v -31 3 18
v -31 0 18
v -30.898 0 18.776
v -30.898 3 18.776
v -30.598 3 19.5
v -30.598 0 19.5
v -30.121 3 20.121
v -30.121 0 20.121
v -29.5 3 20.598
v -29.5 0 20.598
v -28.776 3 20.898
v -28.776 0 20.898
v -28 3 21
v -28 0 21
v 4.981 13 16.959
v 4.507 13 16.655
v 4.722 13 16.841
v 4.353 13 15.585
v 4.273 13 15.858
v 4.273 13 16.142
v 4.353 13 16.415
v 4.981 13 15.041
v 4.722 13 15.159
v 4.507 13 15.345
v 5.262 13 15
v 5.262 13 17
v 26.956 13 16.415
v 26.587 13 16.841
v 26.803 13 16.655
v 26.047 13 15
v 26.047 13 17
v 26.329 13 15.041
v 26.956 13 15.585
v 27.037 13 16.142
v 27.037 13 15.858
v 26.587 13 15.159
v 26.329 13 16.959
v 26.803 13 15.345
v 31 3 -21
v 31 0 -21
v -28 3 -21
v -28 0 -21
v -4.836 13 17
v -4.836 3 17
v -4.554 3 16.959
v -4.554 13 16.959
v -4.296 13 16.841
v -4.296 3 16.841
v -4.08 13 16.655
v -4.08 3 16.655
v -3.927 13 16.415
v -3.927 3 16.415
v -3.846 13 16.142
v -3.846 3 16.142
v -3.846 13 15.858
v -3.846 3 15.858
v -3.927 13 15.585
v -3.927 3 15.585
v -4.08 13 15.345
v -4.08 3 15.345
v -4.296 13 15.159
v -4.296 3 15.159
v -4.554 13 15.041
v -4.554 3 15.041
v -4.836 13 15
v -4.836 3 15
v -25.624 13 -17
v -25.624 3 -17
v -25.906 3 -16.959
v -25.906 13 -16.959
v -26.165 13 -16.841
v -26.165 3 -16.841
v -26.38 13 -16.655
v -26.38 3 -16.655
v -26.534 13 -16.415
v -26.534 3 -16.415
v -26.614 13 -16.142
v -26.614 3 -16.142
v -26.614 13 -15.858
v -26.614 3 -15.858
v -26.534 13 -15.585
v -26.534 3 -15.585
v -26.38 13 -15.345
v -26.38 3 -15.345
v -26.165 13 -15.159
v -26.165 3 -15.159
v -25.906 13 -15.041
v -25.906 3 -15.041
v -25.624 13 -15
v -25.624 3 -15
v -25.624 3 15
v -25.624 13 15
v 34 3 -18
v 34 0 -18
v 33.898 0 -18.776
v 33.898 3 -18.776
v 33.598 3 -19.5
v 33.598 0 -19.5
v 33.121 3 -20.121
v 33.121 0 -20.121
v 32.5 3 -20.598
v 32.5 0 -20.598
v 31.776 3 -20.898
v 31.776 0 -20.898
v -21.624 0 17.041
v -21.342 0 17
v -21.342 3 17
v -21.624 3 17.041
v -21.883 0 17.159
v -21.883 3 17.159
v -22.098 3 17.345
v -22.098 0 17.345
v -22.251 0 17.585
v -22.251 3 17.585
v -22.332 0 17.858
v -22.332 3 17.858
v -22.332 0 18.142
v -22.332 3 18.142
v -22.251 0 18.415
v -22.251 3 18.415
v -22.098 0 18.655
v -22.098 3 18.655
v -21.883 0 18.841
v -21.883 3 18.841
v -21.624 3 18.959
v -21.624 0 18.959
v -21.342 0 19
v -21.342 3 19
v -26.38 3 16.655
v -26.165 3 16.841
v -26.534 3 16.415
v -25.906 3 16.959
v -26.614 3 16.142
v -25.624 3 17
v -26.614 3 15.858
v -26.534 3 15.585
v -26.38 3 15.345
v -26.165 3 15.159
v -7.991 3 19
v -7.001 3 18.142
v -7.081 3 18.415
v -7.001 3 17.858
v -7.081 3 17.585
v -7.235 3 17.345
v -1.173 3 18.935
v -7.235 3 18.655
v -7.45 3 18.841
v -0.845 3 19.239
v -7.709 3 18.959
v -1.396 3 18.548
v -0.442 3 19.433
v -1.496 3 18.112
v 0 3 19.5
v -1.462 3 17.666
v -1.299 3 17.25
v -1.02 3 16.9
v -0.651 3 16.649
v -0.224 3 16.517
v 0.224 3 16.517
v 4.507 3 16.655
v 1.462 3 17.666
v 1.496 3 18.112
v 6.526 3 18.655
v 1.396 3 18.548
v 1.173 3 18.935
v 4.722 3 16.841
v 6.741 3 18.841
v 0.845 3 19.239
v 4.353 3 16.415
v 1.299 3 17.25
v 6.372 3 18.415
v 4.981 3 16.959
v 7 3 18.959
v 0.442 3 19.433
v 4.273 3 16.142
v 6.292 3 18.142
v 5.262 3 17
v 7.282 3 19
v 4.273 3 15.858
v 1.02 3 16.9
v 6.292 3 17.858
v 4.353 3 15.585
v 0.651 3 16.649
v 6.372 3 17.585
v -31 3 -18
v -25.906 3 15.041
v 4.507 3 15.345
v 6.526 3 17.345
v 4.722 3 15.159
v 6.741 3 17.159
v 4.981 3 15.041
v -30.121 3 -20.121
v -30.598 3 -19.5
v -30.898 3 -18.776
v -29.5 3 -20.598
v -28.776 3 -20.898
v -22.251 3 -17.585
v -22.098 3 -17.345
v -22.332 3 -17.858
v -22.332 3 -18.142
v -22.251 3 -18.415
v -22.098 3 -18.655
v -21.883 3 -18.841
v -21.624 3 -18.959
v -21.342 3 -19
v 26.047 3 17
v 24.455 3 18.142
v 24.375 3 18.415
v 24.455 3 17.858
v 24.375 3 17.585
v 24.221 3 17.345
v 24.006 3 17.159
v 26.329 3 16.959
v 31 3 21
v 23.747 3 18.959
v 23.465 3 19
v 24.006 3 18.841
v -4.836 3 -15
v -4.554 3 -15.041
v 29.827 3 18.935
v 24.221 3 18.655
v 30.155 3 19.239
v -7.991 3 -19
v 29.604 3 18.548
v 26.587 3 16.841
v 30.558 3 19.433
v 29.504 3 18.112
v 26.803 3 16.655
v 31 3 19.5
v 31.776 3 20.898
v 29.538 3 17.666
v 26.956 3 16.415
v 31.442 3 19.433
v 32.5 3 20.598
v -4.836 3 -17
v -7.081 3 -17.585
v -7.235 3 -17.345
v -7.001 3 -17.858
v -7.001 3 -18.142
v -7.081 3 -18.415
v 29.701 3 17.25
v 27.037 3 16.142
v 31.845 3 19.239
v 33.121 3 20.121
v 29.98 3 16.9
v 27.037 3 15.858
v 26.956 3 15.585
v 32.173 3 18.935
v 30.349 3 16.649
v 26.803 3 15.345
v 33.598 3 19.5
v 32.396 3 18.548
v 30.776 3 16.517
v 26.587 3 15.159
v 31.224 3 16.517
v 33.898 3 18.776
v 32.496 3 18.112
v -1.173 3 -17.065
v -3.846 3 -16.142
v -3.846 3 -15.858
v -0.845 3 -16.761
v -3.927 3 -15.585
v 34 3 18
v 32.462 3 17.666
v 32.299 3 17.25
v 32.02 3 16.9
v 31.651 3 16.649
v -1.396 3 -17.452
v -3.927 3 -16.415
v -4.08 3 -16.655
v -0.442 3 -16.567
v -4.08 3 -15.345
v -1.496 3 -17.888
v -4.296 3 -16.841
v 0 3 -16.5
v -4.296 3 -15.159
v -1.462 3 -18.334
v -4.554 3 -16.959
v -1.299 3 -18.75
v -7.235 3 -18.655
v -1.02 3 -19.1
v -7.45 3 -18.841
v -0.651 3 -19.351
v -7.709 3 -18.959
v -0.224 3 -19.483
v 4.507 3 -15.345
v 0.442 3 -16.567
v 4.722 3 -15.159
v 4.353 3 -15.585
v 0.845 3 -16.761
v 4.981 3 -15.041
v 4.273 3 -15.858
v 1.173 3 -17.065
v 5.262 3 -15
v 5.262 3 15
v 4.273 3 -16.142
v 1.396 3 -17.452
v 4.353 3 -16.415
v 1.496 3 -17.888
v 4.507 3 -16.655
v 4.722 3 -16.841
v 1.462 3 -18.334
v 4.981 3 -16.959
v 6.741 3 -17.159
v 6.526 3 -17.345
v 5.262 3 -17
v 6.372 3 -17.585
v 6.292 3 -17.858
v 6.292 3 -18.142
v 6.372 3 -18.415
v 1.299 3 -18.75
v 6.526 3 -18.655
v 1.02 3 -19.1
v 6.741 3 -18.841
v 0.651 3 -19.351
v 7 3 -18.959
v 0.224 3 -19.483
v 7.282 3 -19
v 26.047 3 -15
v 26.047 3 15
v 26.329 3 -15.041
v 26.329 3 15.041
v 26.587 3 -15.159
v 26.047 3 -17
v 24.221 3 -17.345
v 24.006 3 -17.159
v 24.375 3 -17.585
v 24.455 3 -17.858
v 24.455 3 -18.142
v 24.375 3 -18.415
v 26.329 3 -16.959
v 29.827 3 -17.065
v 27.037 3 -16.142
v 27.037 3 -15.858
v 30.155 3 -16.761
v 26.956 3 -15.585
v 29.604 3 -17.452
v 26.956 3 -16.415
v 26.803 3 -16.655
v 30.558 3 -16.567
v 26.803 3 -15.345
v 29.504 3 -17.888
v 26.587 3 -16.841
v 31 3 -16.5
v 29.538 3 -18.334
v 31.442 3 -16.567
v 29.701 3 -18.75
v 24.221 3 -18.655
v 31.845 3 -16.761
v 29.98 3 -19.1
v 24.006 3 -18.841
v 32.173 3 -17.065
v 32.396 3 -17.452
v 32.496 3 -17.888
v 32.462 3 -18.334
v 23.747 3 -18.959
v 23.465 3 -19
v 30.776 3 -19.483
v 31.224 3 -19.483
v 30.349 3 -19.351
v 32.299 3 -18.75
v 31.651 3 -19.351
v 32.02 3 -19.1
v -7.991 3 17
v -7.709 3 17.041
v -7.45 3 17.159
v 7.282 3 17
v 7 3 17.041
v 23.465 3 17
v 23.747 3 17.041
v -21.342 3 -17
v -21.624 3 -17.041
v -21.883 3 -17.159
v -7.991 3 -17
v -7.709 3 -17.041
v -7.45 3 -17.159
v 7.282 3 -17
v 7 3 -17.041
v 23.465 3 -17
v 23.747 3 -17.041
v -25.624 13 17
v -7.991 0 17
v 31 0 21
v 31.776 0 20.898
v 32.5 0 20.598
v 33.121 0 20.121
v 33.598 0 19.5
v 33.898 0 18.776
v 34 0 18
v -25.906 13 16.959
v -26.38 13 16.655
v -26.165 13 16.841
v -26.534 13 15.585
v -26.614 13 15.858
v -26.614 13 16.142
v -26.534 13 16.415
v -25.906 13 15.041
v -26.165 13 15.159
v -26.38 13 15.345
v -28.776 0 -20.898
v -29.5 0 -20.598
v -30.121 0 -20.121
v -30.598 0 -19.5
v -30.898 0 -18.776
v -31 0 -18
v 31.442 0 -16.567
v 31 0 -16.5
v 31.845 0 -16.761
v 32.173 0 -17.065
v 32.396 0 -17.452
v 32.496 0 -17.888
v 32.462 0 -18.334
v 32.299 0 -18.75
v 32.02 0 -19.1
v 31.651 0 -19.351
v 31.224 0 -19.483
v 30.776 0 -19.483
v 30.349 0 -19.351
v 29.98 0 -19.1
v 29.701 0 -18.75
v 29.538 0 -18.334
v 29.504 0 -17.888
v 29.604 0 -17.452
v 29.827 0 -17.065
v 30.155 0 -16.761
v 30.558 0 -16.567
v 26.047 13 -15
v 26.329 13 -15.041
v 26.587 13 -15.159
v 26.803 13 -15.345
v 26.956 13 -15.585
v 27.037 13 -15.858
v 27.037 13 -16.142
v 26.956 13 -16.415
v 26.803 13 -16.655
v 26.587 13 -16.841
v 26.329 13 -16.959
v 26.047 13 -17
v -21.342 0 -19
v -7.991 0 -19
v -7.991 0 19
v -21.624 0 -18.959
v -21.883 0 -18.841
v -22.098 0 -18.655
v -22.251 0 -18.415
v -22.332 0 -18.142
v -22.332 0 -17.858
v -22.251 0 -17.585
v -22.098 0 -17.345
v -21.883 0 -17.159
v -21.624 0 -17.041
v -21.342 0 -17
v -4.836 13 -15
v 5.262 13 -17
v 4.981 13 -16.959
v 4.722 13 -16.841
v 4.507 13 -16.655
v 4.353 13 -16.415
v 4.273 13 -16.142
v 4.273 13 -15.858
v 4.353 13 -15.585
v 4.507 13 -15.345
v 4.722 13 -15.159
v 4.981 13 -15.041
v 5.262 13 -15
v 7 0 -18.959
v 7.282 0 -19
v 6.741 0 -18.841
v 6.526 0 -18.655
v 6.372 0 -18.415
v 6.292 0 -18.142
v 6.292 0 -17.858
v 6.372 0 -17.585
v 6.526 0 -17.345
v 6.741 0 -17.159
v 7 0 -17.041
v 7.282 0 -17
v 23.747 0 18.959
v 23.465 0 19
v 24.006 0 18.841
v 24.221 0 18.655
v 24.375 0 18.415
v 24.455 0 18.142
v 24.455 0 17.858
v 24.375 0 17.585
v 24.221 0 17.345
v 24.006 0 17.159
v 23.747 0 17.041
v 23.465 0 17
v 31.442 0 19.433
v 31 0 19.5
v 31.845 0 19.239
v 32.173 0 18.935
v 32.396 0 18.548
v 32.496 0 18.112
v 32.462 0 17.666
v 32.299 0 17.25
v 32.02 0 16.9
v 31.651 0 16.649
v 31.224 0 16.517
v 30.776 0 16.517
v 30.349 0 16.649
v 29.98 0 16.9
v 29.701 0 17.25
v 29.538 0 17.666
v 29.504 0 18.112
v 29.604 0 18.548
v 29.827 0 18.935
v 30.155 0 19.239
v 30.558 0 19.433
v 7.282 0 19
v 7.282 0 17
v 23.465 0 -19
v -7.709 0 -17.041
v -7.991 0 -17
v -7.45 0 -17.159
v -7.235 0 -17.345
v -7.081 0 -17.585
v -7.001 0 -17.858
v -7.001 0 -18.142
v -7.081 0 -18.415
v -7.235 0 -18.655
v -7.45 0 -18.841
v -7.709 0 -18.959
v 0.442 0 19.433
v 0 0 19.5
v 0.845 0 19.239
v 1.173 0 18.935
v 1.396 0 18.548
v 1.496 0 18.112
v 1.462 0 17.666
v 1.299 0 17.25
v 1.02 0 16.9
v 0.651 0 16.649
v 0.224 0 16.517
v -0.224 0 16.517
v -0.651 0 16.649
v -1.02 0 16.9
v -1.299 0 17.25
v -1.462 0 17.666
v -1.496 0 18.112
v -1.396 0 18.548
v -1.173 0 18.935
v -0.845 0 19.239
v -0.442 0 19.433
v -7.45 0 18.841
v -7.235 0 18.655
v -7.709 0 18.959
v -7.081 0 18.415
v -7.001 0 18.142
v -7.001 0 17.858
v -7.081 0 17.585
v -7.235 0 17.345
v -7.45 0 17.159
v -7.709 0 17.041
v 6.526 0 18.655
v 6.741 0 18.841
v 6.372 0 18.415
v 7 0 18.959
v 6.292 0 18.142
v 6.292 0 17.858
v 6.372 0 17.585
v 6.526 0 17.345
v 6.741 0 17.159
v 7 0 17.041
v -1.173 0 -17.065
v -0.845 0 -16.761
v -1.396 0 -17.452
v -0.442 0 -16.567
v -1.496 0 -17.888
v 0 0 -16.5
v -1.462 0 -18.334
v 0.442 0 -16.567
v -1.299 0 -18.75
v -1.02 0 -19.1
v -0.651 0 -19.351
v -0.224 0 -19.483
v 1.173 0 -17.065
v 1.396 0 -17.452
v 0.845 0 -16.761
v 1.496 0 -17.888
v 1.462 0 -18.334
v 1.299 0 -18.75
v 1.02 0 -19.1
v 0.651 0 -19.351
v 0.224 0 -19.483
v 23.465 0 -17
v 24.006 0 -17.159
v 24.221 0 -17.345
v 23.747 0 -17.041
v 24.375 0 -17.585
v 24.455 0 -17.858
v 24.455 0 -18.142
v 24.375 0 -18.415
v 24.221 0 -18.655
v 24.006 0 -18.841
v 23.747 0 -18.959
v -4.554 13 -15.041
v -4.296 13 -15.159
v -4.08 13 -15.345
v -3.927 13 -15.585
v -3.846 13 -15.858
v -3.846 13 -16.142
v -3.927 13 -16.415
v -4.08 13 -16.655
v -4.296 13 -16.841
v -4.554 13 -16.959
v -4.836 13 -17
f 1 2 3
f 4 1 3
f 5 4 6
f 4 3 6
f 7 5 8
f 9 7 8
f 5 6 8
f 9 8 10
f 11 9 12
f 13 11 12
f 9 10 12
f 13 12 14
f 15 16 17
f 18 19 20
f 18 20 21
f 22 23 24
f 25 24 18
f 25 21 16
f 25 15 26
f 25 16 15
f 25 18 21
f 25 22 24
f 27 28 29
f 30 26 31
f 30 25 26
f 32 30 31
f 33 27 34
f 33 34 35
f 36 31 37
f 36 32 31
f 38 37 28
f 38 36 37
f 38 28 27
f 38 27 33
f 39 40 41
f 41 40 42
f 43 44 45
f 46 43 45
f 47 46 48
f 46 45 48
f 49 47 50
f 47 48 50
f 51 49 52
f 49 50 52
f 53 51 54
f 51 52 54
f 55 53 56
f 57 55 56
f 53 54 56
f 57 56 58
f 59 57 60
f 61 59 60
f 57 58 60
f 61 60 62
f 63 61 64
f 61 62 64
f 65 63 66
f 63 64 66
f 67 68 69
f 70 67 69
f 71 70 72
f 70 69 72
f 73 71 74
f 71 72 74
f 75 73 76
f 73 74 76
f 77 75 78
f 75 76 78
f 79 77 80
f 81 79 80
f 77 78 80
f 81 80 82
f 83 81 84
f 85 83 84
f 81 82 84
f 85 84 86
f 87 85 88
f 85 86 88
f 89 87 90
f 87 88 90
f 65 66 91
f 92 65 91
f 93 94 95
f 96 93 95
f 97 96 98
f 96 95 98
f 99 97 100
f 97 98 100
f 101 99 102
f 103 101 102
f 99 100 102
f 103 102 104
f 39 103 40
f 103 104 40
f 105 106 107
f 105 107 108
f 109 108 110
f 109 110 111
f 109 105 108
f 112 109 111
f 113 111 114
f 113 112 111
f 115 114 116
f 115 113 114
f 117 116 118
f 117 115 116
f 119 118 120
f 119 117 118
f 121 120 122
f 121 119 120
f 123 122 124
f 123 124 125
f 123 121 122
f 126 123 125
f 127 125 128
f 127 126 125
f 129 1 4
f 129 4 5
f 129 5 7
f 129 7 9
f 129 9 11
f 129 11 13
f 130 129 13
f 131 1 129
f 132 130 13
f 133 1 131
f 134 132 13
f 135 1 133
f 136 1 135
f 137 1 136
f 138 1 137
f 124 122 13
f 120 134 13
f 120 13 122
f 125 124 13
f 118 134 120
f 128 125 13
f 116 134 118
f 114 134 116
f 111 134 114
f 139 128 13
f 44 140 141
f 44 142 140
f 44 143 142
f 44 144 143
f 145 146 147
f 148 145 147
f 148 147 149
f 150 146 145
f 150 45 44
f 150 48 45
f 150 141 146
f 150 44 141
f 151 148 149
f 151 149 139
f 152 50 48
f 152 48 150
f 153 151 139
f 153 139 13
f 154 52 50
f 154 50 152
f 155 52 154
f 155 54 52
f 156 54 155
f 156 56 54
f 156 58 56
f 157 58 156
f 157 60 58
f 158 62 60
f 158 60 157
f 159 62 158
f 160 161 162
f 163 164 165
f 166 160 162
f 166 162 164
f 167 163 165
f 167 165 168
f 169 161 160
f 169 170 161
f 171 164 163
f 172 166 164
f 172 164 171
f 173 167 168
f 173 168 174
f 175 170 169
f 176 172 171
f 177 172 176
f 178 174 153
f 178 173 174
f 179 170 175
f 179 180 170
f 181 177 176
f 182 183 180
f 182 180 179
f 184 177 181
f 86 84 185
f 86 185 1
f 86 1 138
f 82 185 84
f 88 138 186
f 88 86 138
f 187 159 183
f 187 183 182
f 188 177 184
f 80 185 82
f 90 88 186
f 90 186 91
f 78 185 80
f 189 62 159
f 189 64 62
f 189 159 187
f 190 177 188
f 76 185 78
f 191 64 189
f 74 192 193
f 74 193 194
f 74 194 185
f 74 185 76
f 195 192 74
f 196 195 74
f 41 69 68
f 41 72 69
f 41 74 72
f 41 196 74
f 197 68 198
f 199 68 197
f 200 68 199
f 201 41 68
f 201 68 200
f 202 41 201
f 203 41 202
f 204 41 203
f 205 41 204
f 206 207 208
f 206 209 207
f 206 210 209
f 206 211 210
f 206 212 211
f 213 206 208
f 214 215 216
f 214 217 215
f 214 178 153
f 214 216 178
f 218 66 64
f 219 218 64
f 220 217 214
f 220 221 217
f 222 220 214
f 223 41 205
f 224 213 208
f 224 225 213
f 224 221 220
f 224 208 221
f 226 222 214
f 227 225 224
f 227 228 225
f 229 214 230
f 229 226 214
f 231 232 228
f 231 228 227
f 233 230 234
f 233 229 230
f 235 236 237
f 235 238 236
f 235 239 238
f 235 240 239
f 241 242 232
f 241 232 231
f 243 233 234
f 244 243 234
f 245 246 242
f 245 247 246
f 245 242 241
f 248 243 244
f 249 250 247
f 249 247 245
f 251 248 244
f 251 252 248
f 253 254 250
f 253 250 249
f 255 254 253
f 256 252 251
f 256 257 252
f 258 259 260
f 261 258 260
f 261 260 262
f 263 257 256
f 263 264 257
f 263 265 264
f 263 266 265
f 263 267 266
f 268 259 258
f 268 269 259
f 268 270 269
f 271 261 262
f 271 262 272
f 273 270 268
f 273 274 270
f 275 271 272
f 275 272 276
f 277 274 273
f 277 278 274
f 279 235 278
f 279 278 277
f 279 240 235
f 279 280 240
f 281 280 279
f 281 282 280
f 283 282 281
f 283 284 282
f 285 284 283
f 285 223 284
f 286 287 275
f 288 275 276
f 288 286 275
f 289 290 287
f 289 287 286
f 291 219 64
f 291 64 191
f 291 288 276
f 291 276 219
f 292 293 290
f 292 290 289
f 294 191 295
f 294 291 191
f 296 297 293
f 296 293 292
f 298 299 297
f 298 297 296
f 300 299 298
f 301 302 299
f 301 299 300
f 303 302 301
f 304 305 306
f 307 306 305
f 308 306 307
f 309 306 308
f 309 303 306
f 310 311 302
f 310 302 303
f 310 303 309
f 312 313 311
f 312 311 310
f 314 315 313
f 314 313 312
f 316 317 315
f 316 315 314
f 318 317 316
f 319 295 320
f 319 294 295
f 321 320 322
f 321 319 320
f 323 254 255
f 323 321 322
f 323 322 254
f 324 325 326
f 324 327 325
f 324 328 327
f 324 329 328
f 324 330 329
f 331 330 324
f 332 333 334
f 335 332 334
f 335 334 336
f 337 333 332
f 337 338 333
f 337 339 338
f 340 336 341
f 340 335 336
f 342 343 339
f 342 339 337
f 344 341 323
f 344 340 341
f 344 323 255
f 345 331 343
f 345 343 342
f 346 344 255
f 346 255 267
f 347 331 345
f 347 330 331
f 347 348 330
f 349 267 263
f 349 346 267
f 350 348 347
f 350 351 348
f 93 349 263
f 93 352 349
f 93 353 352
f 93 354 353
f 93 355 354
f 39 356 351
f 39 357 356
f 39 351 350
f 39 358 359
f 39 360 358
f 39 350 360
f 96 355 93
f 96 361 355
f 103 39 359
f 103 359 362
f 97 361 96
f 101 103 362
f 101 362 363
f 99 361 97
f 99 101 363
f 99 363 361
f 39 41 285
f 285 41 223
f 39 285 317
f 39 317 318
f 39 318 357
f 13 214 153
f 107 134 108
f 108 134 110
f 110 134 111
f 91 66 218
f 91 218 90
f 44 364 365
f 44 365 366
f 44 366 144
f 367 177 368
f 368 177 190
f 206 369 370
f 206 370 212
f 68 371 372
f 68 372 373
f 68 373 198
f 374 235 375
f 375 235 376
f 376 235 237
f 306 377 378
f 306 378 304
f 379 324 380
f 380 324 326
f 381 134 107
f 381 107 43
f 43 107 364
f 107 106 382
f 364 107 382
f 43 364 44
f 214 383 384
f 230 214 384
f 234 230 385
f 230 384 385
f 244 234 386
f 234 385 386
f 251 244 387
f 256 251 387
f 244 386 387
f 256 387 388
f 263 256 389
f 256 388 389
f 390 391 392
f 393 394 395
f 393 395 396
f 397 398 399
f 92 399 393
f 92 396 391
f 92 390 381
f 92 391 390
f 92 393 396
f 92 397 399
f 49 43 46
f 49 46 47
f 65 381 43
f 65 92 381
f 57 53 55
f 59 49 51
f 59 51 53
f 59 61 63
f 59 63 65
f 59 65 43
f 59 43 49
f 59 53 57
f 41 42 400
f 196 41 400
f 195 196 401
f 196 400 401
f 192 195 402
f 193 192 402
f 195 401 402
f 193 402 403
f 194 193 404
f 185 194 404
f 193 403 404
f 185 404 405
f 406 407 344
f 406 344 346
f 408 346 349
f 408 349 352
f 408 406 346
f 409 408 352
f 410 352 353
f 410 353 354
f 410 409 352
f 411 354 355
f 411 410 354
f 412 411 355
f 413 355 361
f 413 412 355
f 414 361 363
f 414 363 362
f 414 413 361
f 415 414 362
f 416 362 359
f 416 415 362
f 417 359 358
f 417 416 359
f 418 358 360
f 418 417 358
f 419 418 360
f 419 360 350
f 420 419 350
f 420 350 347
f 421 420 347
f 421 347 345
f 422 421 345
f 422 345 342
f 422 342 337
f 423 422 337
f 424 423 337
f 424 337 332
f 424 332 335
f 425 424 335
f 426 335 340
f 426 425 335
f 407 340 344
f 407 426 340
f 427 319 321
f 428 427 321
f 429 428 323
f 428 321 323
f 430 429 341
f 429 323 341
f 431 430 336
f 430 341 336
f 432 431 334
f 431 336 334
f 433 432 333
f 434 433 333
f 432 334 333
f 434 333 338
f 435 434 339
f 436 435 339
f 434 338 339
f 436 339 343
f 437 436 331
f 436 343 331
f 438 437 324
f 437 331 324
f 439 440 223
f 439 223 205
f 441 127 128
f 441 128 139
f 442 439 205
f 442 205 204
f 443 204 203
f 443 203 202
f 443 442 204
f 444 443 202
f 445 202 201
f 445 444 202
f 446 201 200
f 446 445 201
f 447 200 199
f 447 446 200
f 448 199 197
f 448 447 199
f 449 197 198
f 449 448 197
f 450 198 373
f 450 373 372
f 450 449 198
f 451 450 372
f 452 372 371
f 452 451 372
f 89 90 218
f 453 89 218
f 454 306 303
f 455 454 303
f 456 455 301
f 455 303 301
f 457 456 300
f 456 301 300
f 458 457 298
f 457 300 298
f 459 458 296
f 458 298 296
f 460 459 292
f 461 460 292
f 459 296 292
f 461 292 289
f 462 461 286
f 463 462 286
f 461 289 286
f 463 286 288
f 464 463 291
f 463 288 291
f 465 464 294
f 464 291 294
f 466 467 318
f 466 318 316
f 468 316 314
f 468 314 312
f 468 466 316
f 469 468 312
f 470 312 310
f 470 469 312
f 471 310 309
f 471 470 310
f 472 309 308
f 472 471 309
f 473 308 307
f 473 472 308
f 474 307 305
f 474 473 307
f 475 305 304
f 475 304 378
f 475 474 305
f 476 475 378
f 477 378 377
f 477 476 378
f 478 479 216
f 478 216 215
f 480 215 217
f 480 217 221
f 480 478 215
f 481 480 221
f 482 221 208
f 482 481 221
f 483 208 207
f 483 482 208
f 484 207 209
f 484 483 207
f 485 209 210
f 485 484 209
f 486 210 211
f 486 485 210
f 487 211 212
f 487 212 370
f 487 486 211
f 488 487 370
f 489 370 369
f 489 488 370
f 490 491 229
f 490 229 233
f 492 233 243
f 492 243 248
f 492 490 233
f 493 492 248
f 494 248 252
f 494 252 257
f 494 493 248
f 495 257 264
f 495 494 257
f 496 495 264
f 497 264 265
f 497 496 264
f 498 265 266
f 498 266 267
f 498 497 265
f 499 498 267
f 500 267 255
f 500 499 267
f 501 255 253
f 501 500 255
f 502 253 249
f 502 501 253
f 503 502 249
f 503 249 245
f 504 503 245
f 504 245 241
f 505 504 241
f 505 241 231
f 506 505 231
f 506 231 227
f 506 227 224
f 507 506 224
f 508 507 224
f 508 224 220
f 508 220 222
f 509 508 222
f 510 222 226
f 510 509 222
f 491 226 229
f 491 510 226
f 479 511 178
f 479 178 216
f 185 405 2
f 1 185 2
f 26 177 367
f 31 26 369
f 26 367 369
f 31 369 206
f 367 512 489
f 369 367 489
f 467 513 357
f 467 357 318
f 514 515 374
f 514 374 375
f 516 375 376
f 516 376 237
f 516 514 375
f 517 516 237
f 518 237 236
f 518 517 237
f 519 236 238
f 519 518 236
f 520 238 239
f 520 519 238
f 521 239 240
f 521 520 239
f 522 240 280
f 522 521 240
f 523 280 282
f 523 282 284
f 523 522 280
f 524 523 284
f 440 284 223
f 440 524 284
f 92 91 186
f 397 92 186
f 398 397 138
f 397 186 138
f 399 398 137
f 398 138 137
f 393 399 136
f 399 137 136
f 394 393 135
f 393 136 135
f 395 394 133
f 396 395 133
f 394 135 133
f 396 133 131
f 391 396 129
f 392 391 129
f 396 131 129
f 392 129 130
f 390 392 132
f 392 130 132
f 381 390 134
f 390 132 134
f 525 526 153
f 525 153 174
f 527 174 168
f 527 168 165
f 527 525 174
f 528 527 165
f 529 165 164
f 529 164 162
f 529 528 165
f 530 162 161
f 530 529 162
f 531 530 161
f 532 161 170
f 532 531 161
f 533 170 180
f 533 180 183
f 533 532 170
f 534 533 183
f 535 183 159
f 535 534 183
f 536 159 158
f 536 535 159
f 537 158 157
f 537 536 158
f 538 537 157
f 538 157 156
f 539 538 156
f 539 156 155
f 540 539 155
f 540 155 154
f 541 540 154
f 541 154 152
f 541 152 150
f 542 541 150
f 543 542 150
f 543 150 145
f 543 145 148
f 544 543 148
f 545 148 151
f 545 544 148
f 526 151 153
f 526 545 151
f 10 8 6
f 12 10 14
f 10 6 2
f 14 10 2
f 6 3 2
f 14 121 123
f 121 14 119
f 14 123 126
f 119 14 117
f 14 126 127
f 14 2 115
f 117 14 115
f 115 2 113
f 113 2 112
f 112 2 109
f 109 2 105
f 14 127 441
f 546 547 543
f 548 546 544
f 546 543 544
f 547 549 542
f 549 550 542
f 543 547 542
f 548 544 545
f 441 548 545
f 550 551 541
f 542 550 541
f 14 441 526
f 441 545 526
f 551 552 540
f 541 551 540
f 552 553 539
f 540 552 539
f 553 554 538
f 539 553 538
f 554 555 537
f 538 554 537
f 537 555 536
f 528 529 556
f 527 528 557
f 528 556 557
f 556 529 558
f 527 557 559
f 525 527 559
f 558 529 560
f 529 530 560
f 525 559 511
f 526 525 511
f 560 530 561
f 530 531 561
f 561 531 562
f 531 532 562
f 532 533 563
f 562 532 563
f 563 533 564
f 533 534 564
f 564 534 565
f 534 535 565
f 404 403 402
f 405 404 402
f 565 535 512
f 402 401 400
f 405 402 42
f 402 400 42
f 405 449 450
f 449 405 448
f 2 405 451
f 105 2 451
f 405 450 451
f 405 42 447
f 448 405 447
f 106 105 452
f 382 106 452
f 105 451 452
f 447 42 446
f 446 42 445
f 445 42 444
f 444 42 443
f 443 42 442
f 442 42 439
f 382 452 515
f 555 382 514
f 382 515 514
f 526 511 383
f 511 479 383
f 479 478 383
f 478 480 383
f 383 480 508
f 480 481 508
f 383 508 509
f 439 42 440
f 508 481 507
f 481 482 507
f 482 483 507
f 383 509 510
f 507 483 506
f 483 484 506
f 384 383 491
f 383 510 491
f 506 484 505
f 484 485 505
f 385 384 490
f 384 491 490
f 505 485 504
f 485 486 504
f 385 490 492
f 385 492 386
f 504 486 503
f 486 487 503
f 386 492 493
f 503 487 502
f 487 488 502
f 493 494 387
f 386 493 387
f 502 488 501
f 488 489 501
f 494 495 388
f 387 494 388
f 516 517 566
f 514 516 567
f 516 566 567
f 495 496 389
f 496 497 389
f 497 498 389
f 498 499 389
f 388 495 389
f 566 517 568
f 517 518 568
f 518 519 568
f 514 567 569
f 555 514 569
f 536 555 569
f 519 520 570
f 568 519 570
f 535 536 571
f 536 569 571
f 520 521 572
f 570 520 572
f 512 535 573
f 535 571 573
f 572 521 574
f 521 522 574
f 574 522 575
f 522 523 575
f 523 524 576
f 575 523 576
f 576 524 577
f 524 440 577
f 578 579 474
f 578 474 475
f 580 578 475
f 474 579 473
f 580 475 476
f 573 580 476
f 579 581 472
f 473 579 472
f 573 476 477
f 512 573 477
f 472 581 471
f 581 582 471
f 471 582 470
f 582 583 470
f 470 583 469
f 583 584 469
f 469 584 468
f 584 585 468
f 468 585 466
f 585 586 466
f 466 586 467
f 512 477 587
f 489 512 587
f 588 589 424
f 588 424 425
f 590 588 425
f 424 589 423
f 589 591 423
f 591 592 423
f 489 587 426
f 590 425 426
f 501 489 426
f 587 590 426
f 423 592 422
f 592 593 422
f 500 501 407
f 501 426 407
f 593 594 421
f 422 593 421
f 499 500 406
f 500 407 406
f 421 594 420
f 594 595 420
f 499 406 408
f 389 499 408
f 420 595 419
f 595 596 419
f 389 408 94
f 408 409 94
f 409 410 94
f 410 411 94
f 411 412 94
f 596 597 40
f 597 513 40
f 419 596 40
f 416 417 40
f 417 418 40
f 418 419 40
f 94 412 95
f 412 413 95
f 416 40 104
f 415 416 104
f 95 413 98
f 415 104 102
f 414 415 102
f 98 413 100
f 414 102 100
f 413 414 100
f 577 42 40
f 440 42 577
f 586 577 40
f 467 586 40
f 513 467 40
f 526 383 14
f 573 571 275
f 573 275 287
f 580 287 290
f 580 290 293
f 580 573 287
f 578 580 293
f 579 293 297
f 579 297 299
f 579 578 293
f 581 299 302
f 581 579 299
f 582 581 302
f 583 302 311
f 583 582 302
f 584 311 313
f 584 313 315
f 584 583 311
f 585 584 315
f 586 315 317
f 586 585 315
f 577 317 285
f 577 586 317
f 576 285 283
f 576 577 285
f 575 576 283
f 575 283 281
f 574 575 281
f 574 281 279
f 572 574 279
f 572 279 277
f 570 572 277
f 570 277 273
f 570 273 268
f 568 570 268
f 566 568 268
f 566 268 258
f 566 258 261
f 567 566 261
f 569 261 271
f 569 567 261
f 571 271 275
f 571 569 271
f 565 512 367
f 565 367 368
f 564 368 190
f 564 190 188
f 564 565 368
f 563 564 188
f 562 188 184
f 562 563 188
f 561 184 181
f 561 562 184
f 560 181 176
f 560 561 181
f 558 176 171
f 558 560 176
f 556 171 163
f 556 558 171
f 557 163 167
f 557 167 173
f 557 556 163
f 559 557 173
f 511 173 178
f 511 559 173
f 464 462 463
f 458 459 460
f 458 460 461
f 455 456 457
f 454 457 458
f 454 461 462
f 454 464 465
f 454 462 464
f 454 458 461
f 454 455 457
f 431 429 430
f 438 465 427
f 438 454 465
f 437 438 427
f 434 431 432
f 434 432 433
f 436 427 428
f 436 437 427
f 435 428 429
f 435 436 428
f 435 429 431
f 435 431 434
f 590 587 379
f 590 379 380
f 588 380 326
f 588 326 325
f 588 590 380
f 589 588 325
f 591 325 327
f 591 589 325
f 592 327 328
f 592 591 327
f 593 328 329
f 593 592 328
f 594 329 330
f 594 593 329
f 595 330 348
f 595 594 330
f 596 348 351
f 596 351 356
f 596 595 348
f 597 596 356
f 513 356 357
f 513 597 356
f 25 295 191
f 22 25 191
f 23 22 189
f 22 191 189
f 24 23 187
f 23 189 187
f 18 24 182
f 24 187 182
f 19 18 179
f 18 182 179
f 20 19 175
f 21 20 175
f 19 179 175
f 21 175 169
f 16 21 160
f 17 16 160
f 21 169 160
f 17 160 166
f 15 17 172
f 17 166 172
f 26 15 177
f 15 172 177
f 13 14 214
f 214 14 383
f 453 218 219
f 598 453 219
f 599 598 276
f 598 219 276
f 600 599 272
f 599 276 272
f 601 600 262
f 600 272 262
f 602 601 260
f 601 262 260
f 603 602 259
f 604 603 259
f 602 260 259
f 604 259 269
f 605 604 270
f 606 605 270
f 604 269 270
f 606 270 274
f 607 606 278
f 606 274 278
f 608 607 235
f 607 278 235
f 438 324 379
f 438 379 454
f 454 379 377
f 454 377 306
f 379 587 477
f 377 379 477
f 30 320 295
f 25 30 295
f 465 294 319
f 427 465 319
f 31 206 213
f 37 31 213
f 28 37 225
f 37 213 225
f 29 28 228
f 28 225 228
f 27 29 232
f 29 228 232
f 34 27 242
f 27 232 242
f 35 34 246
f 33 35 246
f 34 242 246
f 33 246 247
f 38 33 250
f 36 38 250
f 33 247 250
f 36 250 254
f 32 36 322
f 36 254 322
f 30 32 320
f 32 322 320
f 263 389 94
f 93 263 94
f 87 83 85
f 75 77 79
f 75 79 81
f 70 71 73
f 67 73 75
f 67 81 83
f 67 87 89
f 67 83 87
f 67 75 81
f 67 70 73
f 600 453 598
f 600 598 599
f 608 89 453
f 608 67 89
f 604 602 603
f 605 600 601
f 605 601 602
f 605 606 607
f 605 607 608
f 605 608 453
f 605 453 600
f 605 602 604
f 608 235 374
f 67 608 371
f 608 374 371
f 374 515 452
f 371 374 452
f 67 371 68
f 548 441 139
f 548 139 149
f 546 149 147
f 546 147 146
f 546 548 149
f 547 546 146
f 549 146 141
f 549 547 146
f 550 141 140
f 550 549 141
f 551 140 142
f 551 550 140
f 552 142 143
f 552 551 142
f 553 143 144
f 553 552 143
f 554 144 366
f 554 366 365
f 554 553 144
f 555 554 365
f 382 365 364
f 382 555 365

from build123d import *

# Parameters (mm, degrees)
SKETCH1_R           = 1.5
BOSS_EXTRUDE1_DEPTH = 3
BOSS_EXTRUDE2_DEPTH = 10


with BuildPart() as part:
    # Sketch1 → Boss-Extrude1 (new body)
    with BuildSketch(Plane(origin=(0, 0, 0), x_dir=(1, 0, 0), z_dir=(0, 1, 0))):
        with BuildLine():
            Line((0, -21), (31, -21))
            ThreePointArc((31, -21), (33.121320344, -20.121320344), (34, -18))
            Line((34, -18), (34, 18))
            ThreePointArc((34, 18), (33.121320344, 20.121320344), (31, 21))
            Line((31, 21), (0, 21))
            Line((0, 21), (-28, 21))
            ThreePointArc((-28, 21), (-30.121320344, 20.121320344), (-31, 18))
            Line((-31, 18), (-31, -18))
            ThreePointArc((-31, -18), (-30.121320344, -20.121320344), (-28, -21))
            Line((-28, -21), (0, -21))
        make_face()
        with Locations(Location((0, 18, 0), (0, 0, 270))):
            Circle(SKETCH1_R, mode=Mode.SUBTRACT)
        with Locations(Location((31, 18, 0), (0, 0, 270))):
            Circle(SKETCH1_R, mode=Mode.SUBTRACT)
        with Locations(Location((31, -18, 0), (0, 0, 270))):
            Circle(SKETCH1_R, mode=Mode.SUBTRACT)
        with Locations(Location((0, -18, 0), (0, 0, 270))):
            Circle(SKETCH1_R, mode=Mode.SUBTRACT)
        with BuildLine():
            Line((-21.341863145, 17), (-7.990756516, 17))
            ThreePointArc((-7.990756516, 17), (-6.990756516, 18), (-7.990756516, 19))
            Line((-7.990756516, 19), (-21.341863145, 19))
            ThreePointArc((-21.341863145, 19), (-22.341863145, 18), (-21.341863145, 17))
        make_face(mode=Mode.SUBTRACT)
        with BuildLine():
            Line((7.282100309, 17), (23.465259859, 17))
            ThreePointArc((23.465259859, 17), (24.465259859, 18), (23.465259859, 19))
            Line((23.465259859, 19), (7.282100309, 19))
            ThreePointArc((7.282100309, 19), (6.282100309, 18), (7.282100309, 17))
        make_face(mode=Mode.SUBTRACT)
        with BuildLine():
            Line((-21.341863145, -19), (-7.990756516, -19))
            ThreePointArc((-7.990756516, -19), (-6.990756516, -18), (-7.990756516, -17))
            Line((-7.990756516, -17), (-21.341863145, -17))
            ThreePointArc((-21.341863145, -17), (-22.341863145, -18), (-21.341863145, -19))
        make_face(mode=Mode.SUBTRACT)
        with BuildLine():
            Line((7.282100309, -19), (23.465259859, -19))
            ThreePointArc((23.465259859, -19), (24.465259859, -18), (23.465259859, -17))
            Line((23.465259859, -17), (7.282100309, -17))
            ThreePointArc((7.282100309, -17), (6.282100309, -18), (7.282100309, -19))
        make_face(mode=Mode.SUBTRACT)
    extrude(amount=BOSS_EXTRUDE1_DEPTH)

    # Sketch2 → Boss-Extrude2 (add)
    with BuildSketch(Plane(origin=(0, 3, 0), x_dir=(1, 0, 0), z_dir=(0, 1, 0))):
        with BuildLine():
            Line((-4.836170767, -15), (-25.624305917, -15))
            ThreePointArc((-25.624305917, -15), (-26.624305917, -16), (-25.624305917, -17))
            Line((-25.624305917, -17), (-4.836170767, -17))
            ThreePointArc((-4.836170767, -17), (-3.836170767, -16), (-4.836170767, -15))
        make_face()
        with BuildLine():
            ThreePointArc((-25.624305917, 17), (-26.624305917, 16), (-25.624305917, 15))
            Line((-25.624305917, 15), (-4.836170767, 15))
            ThreePointArc((-4.836170767, 15), (-3.836170767, 16), (-4.836170767, 17))
            Line((-4.836170767, 17), (-25.624305917, 17))
        make_face()
        with BuildLine():
            Line((26.046785566, -15), (5.262345151, -15))
            ThreePointArc((5.262345151, -15), (4.262345151, -16), (5.262345151, -17))
            Line((5.262345151, -17), (26.046785566, -17))
            ThreePointArc((26.046785566, -17), (27.046785566, -16), (26.046785566, -15))
        make_face()
        with BuildLine():
            ThreePointArc((5.262345151, 17), (4.262345151, 16), (5.262345151, 15))
            Line((5.262345151, 15), (26.046785566, 15))
            ThreePointArc((26.046785566, 15), (27.046785566, 16), (26.046785566, 17))
            Line((26.046785566, 17), (5.262345151, 17))
        make_face()
    extrude(amount=BOSS_EXTRUDE2_DEPTH)


solid = part.part
